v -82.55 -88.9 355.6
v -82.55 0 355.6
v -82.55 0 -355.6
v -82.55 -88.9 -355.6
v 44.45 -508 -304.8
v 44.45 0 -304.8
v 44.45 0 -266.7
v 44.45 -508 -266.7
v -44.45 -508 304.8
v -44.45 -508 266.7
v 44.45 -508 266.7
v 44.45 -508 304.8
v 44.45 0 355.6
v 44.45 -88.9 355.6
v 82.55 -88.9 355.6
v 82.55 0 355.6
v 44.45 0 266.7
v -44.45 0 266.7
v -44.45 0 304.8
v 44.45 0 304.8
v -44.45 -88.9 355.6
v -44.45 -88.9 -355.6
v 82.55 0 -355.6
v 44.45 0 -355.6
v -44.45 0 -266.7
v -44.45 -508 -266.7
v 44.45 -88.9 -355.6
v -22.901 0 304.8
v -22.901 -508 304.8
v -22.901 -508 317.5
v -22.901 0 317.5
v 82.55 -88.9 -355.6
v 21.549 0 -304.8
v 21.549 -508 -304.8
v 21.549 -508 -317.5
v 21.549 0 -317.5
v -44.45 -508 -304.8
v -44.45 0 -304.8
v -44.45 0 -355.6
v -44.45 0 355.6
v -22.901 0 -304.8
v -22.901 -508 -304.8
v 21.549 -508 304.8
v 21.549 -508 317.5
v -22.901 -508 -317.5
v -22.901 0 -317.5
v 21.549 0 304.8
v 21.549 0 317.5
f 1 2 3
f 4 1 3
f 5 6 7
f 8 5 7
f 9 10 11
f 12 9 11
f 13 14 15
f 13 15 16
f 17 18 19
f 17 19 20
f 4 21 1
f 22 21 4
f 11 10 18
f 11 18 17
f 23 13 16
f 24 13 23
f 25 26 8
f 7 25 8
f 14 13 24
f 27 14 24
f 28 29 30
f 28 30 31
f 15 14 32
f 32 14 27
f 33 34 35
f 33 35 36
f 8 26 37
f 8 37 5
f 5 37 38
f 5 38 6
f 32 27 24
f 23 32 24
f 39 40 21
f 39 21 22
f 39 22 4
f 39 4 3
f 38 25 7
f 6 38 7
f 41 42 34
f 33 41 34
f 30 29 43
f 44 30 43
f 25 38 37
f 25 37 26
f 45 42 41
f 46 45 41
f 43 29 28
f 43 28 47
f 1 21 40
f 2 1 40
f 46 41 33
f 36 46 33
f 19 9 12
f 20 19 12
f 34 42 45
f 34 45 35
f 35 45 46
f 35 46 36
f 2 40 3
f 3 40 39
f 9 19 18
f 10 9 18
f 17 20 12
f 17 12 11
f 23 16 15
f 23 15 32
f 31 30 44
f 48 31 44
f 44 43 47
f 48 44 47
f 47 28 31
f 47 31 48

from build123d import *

# Parameters (mm, degrees)
SKETCH3_W            = 88.9
SKETCH3_H            = 38.1
VERTICAL_BOARD_DEPTH = 508
SKETCH6_W            = 711.2
SKETCH6_H            = 88.9
LATERAL_BOARD_DEPTH  = 38.1
SKETCH7_W            = 44.45
SKETCH7_H            = 508
DRAWER_SLIDE_DEPTH   = 12.7


with BuildPart() as part:
    # Sketch3 → Vertical Board (new body)
    with BuildSketch(Plane(origin=(0, 0, 0), x_dir=(1, 0, 0), z_dir=(0, 1, 0))):
        with Locations((0, -285.75)):
            Rectangle(SKETCH3_W, SKETCH3_H)
    extrude(amount=-VERTICAL_BOARD_DEPTH)


with BuildPart() as body_2:
    # Vertical Board Mirror: mirrored copy
    add(part.part.mirror(Plane.XY))


with BuildPart() as body_3:
    # Sketch6 → Lateral Board (new body)
    with BuildSketch(Plane(origin=(44.45, 0, 0), x_dir=(0, 0, -1), z_dir=(1, 0, 0))):
        with Locations((0, -44.45)):
            Rectangle(SKETCH6_W, SKETCH6_H)
    extrude(amount=LATERAL_BOARD_DEPTH)


with BuildPart() as body_4:
    # Lateral Board Mirror: mirrored copy
    add(body_3.part.mirror(Plane(origin=(0, 0, 0), x_dir=(0, 0, 1), z_dir=(1, 0, 0))))


with BuildPart() as body_5:
    # Sketch7 → Drawer Slide (new body)
    with BuildSketch(Plane.XY.offset(304.8)):
        with Locations((-0.675755403, -254)):
            Rectangle(SKETCH7_W, SKETCH7_H)
    extrude(amount=DRAWER_SLIDE_DEPTH)


with BuildPart() as body_6:
    # Drawer Slide Mirror: mirrored copy
    add(body_5.part.mirror(Plane.XY))


solid = Compound([part.part, body_2.part, body_3.part, body_4.part, body_5.part, body_6.part])
